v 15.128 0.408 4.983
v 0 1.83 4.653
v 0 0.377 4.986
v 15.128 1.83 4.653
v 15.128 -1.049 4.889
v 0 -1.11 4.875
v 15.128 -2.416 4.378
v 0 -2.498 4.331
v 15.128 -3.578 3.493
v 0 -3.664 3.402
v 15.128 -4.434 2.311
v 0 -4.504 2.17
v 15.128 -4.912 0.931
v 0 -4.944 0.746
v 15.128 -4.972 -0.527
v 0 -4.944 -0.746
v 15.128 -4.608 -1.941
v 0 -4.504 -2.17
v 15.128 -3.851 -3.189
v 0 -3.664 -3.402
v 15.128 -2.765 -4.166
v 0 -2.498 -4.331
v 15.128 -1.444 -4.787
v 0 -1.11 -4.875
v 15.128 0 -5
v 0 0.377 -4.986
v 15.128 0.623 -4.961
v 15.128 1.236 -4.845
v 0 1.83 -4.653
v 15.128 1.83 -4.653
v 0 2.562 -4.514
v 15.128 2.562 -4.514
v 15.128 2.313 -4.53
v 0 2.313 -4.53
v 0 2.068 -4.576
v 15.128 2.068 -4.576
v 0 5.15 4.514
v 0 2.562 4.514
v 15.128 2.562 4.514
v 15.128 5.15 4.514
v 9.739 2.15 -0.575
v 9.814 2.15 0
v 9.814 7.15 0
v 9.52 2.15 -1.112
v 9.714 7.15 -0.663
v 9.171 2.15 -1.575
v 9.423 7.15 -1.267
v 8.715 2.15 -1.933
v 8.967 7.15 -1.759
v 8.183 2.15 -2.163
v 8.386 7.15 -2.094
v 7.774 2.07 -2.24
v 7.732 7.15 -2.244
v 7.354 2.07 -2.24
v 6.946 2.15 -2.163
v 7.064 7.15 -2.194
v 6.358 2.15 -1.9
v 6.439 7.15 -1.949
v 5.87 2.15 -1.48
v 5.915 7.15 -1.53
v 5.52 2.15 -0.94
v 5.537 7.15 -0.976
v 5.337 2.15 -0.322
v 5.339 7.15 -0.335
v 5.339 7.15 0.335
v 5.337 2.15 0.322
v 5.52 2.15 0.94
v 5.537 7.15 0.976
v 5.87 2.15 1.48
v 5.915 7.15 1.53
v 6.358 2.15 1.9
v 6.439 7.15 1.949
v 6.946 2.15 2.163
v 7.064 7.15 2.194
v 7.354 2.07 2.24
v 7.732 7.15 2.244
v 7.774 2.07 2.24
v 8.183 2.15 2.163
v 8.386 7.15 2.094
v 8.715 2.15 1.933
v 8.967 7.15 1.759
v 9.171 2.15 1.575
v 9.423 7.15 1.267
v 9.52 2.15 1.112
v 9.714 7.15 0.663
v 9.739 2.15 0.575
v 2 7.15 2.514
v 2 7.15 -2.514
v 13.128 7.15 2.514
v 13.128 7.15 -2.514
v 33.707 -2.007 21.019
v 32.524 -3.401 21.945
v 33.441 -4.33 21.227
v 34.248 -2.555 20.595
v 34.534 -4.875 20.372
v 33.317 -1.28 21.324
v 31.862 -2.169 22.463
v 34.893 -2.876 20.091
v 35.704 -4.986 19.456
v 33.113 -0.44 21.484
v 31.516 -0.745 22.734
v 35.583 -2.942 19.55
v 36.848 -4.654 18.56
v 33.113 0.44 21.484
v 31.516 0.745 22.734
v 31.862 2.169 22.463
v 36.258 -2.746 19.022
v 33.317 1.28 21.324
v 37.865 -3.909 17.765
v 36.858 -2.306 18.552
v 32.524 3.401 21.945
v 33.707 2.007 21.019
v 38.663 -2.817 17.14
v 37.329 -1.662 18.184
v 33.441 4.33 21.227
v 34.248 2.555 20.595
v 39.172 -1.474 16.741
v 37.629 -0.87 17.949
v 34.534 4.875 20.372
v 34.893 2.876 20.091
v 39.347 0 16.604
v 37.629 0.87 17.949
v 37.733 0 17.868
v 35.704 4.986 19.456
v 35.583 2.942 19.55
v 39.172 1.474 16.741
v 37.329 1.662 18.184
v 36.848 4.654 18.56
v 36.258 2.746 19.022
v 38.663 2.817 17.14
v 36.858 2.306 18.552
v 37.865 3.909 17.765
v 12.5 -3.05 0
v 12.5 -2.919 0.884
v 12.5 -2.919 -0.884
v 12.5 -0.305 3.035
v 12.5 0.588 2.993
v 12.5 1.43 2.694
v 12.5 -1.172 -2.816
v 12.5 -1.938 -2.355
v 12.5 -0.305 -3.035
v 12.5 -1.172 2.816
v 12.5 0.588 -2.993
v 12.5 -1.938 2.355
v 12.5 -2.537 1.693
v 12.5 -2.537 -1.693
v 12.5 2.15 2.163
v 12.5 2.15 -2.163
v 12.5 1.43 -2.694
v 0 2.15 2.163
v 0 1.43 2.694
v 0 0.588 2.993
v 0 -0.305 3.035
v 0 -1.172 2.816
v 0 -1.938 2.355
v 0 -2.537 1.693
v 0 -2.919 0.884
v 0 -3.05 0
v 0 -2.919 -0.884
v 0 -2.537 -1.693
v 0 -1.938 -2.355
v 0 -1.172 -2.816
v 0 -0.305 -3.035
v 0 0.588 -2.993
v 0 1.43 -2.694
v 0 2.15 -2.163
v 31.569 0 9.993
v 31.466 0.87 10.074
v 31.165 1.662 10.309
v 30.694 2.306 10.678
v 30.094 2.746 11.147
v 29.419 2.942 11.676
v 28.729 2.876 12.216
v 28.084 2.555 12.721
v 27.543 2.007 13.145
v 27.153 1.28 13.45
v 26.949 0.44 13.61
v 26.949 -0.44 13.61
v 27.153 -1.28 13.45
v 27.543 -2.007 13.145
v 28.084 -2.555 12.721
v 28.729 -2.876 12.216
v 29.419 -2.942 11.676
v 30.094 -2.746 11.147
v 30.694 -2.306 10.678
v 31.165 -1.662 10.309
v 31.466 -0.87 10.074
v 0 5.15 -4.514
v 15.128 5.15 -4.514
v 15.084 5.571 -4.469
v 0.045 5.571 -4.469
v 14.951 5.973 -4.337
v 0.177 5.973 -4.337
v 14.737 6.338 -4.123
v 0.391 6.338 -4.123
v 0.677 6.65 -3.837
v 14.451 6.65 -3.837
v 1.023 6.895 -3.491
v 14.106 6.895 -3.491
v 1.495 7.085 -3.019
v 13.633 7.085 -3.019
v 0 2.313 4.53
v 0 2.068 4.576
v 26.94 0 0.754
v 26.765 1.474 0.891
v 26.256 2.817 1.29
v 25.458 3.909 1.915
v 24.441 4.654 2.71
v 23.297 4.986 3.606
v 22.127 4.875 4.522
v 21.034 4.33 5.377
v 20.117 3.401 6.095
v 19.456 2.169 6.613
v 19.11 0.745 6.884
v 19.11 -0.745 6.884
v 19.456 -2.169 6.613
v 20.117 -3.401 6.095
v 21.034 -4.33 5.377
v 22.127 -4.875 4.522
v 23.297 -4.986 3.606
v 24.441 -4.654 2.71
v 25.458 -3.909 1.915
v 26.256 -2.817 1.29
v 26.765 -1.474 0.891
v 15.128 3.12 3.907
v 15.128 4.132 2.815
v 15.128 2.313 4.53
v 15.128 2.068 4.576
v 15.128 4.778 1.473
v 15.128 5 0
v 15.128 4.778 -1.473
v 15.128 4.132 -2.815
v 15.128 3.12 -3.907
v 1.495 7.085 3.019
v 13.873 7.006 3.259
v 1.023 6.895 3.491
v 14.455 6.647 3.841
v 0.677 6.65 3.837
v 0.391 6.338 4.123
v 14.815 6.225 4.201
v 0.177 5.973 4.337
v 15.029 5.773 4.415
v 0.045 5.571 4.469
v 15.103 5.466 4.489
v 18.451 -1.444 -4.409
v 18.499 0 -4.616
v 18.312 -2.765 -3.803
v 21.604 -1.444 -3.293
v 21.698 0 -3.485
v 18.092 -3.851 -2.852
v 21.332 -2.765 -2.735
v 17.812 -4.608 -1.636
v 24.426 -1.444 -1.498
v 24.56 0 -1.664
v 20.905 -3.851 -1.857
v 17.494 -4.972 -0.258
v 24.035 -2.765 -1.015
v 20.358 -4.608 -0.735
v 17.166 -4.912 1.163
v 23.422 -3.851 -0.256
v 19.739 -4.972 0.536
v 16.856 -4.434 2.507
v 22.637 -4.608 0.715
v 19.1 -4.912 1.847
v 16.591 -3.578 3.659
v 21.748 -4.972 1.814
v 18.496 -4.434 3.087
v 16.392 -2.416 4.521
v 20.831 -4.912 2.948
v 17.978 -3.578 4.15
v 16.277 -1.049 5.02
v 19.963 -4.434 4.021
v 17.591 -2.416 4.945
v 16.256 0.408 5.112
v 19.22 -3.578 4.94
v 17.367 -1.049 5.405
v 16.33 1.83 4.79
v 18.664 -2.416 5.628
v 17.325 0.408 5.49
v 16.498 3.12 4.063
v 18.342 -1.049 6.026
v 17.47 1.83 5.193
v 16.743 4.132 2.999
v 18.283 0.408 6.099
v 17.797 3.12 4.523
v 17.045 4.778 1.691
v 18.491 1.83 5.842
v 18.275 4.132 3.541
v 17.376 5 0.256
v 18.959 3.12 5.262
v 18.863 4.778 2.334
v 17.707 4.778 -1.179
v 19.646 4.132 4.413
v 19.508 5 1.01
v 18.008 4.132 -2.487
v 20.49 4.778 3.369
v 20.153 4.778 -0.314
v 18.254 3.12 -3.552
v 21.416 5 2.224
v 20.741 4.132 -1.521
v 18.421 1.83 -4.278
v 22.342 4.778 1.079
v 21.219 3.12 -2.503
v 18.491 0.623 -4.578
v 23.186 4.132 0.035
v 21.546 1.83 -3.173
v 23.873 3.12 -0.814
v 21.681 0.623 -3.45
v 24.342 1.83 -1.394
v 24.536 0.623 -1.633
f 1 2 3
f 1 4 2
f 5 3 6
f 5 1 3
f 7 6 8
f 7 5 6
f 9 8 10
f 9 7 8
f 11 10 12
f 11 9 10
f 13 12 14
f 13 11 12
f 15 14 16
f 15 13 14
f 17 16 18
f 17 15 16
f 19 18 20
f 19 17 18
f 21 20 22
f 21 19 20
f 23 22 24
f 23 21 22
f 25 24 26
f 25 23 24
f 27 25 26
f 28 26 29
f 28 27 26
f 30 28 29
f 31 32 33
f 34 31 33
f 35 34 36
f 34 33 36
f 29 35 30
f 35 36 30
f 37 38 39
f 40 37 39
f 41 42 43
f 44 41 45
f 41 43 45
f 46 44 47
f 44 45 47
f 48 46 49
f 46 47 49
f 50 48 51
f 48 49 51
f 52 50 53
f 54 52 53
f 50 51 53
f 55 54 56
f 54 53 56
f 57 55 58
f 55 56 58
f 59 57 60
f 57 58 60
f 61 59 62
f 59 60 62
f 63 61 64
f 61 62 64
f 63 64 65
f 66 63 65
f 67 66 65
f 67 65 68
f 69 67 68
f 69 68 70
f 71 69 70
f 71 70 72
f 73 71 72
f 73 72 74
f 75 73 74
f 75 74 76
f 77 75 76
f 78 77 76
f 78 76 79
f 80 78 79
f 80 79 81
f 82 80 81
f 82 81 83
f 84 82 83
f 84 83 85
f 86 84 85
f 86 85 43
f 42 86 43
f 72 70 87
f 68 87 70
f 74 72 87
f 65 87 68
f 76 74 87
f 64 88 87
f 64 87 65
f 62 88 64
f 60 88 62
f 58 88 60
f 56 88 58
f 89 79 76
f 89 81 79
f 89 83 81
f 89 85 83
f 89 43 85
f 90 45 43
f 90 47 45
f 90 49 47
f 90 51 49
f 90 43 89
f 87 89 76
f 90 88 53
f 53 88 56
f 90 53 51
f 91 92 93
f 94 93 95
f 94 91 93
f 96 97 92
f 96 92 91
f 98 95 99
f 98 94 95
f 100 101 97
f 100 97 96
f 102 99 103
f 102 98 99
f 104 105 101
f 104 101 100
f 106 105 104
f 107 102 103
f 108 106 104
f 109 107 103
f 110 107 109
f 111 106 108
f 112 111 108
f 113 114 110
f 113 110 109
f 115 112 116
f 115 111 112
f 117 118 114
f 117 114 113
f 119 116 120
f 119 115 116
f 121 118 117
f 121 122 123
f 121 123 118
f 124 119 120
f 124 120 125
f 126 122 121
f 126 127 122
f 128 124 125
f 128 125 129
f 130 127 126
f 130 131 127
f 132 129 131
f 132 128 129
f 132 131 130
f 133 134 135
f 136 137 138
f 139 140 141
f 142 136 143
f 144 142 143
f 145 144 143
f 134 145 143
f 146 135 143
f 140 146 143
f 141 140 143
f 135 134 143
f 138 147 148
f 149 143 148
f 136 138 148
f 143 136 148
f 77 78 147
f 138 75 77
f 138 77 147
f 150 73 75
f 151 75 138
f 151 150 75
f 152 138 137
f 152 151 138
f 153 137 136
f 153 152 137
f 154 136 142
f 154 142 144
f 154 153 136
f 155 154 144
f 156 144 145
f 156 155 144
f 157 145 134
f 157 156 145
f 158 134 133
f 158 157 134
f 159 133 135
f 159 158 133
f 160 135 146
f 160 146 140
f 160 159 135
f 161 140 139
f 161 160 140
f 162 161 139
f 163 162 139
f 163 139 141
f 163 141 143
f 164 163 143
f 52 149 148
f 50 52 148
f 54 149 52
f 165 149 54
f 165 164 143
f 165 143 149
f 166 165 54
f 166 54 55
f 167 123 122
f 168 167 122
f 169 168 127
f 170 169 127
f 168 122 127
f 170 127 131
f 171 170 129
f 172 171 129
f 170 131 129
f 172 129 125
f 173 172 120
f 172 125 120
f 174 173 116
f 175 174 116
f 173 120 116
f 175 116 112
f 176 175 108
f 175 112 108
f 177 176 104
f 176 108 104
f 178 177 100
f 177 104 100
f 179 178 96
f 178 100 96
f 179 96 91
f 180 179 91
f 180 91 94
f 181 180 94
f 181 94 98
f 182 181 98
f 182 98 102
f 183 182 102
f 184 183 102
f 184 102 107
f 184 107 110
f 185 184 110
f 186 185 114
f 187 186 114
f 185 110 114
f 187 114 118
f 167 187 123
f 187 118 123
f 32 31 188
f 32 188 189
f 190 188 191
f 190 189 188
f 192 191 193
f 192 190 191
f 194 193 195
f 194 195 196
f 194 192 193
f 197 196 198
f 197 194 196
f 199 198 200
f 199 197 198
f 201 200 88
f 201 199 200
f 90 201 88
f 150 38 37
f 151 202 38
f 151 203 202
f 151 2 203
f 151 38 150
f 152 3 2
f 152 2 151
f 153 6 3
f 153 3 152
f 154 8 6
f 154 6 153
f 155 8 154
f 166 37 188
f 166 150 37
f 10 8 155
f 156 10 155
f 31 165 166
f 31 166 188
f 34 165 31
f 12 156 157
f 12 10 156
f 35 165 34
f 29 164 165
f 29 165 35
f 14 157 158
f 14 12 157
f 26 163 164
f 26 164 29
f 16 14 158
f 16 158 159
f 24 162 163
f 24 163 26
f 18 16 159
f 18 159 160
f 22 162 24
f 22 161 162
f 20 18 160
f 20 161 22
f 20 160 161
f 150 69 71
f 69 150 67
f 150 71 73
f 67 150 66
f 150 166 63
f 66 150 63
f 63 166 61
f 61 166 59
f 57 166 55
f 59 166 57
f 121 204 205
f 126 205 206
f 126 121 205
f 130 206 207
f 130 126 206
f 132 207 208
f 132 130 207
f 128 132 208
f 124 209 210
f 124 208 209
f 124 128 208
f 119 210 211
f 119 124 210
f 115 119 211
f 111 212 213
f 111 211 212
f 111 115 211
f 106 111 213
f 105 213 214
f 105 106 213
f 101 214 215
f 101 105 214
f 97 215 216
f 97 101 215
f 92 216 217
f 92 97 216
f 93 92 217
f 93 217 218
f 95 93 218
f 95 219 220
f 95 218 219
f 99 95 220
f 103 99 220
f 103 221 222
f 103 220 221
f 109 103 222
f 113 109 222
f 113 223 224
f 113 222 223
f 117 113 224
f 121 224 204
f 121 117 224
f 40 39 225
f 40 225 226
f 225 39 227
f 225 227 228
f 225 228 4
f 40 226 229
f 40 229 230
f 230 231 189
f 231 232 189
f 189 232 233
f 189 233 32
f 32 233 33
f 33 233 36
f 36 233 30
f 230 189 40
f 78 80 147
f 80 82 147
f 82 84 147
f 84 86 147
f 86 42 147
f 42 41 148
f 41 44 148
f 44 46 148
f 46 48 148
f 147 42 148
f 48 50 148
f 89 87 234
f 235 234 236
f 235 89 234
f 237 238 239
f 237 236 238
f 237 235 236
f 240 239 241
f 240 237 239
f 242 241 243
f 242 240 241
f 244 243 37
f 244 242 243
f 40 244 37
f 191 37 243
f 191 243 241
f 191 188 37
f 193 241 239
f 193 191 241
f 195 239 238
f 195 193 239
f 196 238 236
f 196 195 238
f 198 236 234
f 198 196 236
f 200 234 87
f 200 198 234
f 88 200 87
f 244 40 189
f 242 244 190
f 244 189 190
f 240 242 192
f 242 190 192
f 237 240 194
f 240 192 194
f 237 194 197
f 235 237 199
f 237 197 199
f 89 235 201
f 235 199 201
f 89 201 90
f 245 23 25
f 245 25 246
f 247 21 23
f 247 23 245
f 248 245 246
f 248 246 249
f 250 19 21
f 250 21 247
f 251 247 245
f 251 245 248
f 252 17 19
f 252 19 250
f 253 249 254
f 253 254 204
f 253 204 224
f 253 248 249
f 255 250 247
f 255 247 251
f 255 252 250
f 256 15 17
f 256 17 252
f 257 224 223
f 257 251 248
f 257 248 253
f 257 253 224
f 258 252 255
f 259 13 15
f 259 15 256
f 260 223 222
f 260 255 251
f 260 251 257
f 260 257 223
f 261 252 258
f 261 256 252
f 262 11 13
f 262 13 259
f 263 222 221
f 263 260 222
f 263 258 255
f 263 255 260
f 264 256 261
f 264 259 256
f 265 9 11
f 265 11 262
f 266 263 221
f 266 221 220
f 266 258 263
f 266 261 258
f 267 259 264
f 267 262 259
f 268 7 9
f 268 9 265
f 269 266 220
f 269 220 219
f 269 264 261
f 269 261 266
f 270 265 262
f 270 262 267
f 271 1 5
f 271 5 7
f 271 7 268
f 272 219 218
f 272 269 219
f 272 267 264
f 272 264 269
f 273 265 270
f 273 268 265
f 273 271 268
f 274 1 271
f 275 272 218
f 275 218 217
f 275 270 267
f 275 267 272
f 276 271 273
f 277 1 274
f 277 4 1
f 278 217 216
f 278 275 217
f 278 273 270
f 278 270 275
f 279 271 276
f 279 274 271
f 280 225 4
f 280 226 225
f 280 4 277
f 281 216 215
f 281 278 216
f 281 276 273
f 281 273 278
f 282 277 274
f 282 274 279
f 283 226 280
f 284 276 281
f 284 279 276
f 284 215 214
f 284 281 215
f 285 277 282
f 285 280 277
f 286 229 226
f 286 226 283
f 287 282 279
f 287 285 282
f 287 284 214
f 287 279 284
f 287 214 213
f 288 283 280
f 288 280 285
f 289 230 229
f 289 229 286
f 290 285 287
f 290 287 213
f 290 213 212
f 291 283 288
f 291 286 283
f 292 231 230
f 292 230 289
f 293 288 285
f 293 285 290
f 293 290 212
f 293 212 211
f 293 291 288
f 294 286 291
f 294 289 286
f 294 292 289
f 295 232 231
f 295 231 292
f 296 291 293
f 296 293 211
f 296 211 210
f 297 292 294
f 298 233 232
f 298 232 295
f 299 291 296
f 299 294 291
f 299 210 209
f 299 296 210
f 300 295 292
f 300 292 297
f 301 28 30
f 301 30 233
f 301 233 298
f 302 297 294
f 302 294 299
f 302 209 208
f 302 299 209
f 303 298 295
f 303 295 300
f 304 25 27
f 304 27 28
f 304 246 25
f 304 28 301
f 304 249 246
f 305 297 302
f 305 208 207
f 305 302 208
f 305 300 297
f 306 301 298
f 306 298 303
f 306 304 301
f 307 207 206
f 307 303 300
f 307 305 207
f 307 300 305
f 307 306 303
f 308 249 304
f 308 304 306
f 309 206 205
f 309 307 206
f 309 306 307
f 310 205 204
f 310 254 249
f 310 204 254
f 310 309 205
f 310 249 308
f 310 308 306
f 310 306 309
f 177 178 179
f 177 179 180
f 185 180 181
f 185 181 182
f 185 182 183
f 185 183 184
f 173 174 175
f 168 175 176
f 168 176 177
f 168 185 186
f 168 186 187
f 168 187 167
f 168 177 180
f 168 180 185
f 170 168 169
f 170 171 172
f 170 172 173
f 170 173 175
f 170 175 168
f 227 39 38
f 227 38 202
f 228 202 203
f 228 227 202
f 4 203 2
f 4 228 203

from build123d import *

# Parameters (mm, degrees)
SKETCH2_R           = 5
CUT_EXTRUDE1_DEPTH  = 12.5
SKETCH5_R           = 2.95
CUT_EXTRUDE3_DEPTH  = 10
SKETCH14_W          = 15.128379637
SKETCH14_H          = 10
CUT_EXTRUDE4_DEPTH  = 5
SKETCH15_W          = 15.128379637
SKETCH15_H          = 9.028288874
BOSS_EXTRUDE3_DEPTH = 5
FILLET2_R           = 2
FILLET3_R           = 2
CUT_EXTRUDE5_REACH  = 14.15
SKETCH16_R          = 2.25


with BuildPart() as part:
    # Sweep1: sweep along a path in Sketch1
    with BuildLine(Plane(origin=(0, 0, 0), x_dir=(1, 0, 0), z_dir=(0, 1, 0))) as sweep1_path:
        Line((0, 0), (15.128379637, 0))
        ThreePointArc((15.128379637, 0), (19.50794708, -1.010039543), (23.002807262, -3.836122196))
        Line((23.002807262, -3.836122196), (35.409694509, -19.686069062))
    # Sketch2 → Sweep1 (sweep)
    with BuildSketch(Plane(origin=(0, 0, 0), x_dir=(0, 0, -1), z_dir=(1, 0, 0))):
        Circle(SKETCH2_R)
    sweep(path=sweep1_path.line)

    # Sketch4 → Cut-Extrude1 (cut)
    with BuildSketch(Plane.ZY):
        with BuildLine():
            Line((-2.163330765, 2.15), (2.163330765, 2.15))
            ThreePointArc((2.163330765, 2.15), (0, -3.05), (-2.163330765, 2.15))
        make_face()
    extrude(amount=-CUT_EXTRUDE1_DEPTH, mode=Mode.SUBTRACT)

    # Sketch5 → Cut-Extrude3 (cut)
    with BuildSketch(Plane(origin=(23.008372425, 0, 29.393470993), x_dir=(0.787442762, 0, -0.61638778), z_dir=(0.61638778, 0, 0.787442762))):
        with Locations((15.74885525, 0)):
            Circle(SKETCH5_R)
    extrude(amount=-CUT_EXTRUDE3_DEPTH, mode=Mode.SUBTRACT)

    # Sketch14 → Cut-Extrude4 (cut)
    with BuildSketch(Plane.XZ.offset(-2.15)):
        with Locations((7.564189819, 0)):
            Rectangle(SKETCH14_W, SKETCH14_H)
    extrude(amount=-CUT_EXTRUDE4_DEPTH, mode=Mode.SUBTRACT)

    # Sketch15 → Boss-Extrude3 (add)
    with BuildSketch(Plane(origin=(0, 2.15, 0), x_dir=(1, 0, 0), z_dir=(0, 1, 0))):
        with Locations((7.564189819, 0)):
            Rectangle(SKETCH15_W, SKETCH15_H)
    extrude(amount=BOSS_EXTRUDE3_DEPTH)

    # Fillet2
    fillet2_edges = [part.edges().sort_by_distance(p)[0] for p in [
        (7.564189819, 2.15, -4.514144437),
        (7.564189819, 2.15, 4.514144437),
    ]]
    fillet(fillet2_edges, radius=FILLET2_R)

    # Fillet3
    fillet3_edges = [part.edges().sort_by_distance(p)[0] for p in [
        (0, 7.15, 0),
        (7.564189819, 7.15, 4.514144437),
        (15.128379637, 7.15, 0),
        (7.564189819, 7.15, -4.514144437),
    ]]
    fillet(fillet3_edges, radius=FILLET3_R)

    # Sketch16 → Cut-Extrude5 (cut, up to next)
    with BuildSketch(Plane(origin=(0, 7.15, 0), x_dir=(1, 0, 0), z_dir=(0, 1, 0)), mode=Mode.PRIVATE) as cut_extrude5_sk1:
        with Locations((7.564189819, 0)):
            Circle(SKETCH16_R)
    cut_extrude5_tool1 = extrude(cut_extrude5_sk1.sketch, amount=-CUT_EXTRUDE5_REACH, mode=Mode.PRIVATE) & part.part
    add(cut_extrude5_tool1.solids().sort_by_distance((7.56419, 7.15, 0))[0], mode=Mode.SUBTRACT)


solid = part.part
